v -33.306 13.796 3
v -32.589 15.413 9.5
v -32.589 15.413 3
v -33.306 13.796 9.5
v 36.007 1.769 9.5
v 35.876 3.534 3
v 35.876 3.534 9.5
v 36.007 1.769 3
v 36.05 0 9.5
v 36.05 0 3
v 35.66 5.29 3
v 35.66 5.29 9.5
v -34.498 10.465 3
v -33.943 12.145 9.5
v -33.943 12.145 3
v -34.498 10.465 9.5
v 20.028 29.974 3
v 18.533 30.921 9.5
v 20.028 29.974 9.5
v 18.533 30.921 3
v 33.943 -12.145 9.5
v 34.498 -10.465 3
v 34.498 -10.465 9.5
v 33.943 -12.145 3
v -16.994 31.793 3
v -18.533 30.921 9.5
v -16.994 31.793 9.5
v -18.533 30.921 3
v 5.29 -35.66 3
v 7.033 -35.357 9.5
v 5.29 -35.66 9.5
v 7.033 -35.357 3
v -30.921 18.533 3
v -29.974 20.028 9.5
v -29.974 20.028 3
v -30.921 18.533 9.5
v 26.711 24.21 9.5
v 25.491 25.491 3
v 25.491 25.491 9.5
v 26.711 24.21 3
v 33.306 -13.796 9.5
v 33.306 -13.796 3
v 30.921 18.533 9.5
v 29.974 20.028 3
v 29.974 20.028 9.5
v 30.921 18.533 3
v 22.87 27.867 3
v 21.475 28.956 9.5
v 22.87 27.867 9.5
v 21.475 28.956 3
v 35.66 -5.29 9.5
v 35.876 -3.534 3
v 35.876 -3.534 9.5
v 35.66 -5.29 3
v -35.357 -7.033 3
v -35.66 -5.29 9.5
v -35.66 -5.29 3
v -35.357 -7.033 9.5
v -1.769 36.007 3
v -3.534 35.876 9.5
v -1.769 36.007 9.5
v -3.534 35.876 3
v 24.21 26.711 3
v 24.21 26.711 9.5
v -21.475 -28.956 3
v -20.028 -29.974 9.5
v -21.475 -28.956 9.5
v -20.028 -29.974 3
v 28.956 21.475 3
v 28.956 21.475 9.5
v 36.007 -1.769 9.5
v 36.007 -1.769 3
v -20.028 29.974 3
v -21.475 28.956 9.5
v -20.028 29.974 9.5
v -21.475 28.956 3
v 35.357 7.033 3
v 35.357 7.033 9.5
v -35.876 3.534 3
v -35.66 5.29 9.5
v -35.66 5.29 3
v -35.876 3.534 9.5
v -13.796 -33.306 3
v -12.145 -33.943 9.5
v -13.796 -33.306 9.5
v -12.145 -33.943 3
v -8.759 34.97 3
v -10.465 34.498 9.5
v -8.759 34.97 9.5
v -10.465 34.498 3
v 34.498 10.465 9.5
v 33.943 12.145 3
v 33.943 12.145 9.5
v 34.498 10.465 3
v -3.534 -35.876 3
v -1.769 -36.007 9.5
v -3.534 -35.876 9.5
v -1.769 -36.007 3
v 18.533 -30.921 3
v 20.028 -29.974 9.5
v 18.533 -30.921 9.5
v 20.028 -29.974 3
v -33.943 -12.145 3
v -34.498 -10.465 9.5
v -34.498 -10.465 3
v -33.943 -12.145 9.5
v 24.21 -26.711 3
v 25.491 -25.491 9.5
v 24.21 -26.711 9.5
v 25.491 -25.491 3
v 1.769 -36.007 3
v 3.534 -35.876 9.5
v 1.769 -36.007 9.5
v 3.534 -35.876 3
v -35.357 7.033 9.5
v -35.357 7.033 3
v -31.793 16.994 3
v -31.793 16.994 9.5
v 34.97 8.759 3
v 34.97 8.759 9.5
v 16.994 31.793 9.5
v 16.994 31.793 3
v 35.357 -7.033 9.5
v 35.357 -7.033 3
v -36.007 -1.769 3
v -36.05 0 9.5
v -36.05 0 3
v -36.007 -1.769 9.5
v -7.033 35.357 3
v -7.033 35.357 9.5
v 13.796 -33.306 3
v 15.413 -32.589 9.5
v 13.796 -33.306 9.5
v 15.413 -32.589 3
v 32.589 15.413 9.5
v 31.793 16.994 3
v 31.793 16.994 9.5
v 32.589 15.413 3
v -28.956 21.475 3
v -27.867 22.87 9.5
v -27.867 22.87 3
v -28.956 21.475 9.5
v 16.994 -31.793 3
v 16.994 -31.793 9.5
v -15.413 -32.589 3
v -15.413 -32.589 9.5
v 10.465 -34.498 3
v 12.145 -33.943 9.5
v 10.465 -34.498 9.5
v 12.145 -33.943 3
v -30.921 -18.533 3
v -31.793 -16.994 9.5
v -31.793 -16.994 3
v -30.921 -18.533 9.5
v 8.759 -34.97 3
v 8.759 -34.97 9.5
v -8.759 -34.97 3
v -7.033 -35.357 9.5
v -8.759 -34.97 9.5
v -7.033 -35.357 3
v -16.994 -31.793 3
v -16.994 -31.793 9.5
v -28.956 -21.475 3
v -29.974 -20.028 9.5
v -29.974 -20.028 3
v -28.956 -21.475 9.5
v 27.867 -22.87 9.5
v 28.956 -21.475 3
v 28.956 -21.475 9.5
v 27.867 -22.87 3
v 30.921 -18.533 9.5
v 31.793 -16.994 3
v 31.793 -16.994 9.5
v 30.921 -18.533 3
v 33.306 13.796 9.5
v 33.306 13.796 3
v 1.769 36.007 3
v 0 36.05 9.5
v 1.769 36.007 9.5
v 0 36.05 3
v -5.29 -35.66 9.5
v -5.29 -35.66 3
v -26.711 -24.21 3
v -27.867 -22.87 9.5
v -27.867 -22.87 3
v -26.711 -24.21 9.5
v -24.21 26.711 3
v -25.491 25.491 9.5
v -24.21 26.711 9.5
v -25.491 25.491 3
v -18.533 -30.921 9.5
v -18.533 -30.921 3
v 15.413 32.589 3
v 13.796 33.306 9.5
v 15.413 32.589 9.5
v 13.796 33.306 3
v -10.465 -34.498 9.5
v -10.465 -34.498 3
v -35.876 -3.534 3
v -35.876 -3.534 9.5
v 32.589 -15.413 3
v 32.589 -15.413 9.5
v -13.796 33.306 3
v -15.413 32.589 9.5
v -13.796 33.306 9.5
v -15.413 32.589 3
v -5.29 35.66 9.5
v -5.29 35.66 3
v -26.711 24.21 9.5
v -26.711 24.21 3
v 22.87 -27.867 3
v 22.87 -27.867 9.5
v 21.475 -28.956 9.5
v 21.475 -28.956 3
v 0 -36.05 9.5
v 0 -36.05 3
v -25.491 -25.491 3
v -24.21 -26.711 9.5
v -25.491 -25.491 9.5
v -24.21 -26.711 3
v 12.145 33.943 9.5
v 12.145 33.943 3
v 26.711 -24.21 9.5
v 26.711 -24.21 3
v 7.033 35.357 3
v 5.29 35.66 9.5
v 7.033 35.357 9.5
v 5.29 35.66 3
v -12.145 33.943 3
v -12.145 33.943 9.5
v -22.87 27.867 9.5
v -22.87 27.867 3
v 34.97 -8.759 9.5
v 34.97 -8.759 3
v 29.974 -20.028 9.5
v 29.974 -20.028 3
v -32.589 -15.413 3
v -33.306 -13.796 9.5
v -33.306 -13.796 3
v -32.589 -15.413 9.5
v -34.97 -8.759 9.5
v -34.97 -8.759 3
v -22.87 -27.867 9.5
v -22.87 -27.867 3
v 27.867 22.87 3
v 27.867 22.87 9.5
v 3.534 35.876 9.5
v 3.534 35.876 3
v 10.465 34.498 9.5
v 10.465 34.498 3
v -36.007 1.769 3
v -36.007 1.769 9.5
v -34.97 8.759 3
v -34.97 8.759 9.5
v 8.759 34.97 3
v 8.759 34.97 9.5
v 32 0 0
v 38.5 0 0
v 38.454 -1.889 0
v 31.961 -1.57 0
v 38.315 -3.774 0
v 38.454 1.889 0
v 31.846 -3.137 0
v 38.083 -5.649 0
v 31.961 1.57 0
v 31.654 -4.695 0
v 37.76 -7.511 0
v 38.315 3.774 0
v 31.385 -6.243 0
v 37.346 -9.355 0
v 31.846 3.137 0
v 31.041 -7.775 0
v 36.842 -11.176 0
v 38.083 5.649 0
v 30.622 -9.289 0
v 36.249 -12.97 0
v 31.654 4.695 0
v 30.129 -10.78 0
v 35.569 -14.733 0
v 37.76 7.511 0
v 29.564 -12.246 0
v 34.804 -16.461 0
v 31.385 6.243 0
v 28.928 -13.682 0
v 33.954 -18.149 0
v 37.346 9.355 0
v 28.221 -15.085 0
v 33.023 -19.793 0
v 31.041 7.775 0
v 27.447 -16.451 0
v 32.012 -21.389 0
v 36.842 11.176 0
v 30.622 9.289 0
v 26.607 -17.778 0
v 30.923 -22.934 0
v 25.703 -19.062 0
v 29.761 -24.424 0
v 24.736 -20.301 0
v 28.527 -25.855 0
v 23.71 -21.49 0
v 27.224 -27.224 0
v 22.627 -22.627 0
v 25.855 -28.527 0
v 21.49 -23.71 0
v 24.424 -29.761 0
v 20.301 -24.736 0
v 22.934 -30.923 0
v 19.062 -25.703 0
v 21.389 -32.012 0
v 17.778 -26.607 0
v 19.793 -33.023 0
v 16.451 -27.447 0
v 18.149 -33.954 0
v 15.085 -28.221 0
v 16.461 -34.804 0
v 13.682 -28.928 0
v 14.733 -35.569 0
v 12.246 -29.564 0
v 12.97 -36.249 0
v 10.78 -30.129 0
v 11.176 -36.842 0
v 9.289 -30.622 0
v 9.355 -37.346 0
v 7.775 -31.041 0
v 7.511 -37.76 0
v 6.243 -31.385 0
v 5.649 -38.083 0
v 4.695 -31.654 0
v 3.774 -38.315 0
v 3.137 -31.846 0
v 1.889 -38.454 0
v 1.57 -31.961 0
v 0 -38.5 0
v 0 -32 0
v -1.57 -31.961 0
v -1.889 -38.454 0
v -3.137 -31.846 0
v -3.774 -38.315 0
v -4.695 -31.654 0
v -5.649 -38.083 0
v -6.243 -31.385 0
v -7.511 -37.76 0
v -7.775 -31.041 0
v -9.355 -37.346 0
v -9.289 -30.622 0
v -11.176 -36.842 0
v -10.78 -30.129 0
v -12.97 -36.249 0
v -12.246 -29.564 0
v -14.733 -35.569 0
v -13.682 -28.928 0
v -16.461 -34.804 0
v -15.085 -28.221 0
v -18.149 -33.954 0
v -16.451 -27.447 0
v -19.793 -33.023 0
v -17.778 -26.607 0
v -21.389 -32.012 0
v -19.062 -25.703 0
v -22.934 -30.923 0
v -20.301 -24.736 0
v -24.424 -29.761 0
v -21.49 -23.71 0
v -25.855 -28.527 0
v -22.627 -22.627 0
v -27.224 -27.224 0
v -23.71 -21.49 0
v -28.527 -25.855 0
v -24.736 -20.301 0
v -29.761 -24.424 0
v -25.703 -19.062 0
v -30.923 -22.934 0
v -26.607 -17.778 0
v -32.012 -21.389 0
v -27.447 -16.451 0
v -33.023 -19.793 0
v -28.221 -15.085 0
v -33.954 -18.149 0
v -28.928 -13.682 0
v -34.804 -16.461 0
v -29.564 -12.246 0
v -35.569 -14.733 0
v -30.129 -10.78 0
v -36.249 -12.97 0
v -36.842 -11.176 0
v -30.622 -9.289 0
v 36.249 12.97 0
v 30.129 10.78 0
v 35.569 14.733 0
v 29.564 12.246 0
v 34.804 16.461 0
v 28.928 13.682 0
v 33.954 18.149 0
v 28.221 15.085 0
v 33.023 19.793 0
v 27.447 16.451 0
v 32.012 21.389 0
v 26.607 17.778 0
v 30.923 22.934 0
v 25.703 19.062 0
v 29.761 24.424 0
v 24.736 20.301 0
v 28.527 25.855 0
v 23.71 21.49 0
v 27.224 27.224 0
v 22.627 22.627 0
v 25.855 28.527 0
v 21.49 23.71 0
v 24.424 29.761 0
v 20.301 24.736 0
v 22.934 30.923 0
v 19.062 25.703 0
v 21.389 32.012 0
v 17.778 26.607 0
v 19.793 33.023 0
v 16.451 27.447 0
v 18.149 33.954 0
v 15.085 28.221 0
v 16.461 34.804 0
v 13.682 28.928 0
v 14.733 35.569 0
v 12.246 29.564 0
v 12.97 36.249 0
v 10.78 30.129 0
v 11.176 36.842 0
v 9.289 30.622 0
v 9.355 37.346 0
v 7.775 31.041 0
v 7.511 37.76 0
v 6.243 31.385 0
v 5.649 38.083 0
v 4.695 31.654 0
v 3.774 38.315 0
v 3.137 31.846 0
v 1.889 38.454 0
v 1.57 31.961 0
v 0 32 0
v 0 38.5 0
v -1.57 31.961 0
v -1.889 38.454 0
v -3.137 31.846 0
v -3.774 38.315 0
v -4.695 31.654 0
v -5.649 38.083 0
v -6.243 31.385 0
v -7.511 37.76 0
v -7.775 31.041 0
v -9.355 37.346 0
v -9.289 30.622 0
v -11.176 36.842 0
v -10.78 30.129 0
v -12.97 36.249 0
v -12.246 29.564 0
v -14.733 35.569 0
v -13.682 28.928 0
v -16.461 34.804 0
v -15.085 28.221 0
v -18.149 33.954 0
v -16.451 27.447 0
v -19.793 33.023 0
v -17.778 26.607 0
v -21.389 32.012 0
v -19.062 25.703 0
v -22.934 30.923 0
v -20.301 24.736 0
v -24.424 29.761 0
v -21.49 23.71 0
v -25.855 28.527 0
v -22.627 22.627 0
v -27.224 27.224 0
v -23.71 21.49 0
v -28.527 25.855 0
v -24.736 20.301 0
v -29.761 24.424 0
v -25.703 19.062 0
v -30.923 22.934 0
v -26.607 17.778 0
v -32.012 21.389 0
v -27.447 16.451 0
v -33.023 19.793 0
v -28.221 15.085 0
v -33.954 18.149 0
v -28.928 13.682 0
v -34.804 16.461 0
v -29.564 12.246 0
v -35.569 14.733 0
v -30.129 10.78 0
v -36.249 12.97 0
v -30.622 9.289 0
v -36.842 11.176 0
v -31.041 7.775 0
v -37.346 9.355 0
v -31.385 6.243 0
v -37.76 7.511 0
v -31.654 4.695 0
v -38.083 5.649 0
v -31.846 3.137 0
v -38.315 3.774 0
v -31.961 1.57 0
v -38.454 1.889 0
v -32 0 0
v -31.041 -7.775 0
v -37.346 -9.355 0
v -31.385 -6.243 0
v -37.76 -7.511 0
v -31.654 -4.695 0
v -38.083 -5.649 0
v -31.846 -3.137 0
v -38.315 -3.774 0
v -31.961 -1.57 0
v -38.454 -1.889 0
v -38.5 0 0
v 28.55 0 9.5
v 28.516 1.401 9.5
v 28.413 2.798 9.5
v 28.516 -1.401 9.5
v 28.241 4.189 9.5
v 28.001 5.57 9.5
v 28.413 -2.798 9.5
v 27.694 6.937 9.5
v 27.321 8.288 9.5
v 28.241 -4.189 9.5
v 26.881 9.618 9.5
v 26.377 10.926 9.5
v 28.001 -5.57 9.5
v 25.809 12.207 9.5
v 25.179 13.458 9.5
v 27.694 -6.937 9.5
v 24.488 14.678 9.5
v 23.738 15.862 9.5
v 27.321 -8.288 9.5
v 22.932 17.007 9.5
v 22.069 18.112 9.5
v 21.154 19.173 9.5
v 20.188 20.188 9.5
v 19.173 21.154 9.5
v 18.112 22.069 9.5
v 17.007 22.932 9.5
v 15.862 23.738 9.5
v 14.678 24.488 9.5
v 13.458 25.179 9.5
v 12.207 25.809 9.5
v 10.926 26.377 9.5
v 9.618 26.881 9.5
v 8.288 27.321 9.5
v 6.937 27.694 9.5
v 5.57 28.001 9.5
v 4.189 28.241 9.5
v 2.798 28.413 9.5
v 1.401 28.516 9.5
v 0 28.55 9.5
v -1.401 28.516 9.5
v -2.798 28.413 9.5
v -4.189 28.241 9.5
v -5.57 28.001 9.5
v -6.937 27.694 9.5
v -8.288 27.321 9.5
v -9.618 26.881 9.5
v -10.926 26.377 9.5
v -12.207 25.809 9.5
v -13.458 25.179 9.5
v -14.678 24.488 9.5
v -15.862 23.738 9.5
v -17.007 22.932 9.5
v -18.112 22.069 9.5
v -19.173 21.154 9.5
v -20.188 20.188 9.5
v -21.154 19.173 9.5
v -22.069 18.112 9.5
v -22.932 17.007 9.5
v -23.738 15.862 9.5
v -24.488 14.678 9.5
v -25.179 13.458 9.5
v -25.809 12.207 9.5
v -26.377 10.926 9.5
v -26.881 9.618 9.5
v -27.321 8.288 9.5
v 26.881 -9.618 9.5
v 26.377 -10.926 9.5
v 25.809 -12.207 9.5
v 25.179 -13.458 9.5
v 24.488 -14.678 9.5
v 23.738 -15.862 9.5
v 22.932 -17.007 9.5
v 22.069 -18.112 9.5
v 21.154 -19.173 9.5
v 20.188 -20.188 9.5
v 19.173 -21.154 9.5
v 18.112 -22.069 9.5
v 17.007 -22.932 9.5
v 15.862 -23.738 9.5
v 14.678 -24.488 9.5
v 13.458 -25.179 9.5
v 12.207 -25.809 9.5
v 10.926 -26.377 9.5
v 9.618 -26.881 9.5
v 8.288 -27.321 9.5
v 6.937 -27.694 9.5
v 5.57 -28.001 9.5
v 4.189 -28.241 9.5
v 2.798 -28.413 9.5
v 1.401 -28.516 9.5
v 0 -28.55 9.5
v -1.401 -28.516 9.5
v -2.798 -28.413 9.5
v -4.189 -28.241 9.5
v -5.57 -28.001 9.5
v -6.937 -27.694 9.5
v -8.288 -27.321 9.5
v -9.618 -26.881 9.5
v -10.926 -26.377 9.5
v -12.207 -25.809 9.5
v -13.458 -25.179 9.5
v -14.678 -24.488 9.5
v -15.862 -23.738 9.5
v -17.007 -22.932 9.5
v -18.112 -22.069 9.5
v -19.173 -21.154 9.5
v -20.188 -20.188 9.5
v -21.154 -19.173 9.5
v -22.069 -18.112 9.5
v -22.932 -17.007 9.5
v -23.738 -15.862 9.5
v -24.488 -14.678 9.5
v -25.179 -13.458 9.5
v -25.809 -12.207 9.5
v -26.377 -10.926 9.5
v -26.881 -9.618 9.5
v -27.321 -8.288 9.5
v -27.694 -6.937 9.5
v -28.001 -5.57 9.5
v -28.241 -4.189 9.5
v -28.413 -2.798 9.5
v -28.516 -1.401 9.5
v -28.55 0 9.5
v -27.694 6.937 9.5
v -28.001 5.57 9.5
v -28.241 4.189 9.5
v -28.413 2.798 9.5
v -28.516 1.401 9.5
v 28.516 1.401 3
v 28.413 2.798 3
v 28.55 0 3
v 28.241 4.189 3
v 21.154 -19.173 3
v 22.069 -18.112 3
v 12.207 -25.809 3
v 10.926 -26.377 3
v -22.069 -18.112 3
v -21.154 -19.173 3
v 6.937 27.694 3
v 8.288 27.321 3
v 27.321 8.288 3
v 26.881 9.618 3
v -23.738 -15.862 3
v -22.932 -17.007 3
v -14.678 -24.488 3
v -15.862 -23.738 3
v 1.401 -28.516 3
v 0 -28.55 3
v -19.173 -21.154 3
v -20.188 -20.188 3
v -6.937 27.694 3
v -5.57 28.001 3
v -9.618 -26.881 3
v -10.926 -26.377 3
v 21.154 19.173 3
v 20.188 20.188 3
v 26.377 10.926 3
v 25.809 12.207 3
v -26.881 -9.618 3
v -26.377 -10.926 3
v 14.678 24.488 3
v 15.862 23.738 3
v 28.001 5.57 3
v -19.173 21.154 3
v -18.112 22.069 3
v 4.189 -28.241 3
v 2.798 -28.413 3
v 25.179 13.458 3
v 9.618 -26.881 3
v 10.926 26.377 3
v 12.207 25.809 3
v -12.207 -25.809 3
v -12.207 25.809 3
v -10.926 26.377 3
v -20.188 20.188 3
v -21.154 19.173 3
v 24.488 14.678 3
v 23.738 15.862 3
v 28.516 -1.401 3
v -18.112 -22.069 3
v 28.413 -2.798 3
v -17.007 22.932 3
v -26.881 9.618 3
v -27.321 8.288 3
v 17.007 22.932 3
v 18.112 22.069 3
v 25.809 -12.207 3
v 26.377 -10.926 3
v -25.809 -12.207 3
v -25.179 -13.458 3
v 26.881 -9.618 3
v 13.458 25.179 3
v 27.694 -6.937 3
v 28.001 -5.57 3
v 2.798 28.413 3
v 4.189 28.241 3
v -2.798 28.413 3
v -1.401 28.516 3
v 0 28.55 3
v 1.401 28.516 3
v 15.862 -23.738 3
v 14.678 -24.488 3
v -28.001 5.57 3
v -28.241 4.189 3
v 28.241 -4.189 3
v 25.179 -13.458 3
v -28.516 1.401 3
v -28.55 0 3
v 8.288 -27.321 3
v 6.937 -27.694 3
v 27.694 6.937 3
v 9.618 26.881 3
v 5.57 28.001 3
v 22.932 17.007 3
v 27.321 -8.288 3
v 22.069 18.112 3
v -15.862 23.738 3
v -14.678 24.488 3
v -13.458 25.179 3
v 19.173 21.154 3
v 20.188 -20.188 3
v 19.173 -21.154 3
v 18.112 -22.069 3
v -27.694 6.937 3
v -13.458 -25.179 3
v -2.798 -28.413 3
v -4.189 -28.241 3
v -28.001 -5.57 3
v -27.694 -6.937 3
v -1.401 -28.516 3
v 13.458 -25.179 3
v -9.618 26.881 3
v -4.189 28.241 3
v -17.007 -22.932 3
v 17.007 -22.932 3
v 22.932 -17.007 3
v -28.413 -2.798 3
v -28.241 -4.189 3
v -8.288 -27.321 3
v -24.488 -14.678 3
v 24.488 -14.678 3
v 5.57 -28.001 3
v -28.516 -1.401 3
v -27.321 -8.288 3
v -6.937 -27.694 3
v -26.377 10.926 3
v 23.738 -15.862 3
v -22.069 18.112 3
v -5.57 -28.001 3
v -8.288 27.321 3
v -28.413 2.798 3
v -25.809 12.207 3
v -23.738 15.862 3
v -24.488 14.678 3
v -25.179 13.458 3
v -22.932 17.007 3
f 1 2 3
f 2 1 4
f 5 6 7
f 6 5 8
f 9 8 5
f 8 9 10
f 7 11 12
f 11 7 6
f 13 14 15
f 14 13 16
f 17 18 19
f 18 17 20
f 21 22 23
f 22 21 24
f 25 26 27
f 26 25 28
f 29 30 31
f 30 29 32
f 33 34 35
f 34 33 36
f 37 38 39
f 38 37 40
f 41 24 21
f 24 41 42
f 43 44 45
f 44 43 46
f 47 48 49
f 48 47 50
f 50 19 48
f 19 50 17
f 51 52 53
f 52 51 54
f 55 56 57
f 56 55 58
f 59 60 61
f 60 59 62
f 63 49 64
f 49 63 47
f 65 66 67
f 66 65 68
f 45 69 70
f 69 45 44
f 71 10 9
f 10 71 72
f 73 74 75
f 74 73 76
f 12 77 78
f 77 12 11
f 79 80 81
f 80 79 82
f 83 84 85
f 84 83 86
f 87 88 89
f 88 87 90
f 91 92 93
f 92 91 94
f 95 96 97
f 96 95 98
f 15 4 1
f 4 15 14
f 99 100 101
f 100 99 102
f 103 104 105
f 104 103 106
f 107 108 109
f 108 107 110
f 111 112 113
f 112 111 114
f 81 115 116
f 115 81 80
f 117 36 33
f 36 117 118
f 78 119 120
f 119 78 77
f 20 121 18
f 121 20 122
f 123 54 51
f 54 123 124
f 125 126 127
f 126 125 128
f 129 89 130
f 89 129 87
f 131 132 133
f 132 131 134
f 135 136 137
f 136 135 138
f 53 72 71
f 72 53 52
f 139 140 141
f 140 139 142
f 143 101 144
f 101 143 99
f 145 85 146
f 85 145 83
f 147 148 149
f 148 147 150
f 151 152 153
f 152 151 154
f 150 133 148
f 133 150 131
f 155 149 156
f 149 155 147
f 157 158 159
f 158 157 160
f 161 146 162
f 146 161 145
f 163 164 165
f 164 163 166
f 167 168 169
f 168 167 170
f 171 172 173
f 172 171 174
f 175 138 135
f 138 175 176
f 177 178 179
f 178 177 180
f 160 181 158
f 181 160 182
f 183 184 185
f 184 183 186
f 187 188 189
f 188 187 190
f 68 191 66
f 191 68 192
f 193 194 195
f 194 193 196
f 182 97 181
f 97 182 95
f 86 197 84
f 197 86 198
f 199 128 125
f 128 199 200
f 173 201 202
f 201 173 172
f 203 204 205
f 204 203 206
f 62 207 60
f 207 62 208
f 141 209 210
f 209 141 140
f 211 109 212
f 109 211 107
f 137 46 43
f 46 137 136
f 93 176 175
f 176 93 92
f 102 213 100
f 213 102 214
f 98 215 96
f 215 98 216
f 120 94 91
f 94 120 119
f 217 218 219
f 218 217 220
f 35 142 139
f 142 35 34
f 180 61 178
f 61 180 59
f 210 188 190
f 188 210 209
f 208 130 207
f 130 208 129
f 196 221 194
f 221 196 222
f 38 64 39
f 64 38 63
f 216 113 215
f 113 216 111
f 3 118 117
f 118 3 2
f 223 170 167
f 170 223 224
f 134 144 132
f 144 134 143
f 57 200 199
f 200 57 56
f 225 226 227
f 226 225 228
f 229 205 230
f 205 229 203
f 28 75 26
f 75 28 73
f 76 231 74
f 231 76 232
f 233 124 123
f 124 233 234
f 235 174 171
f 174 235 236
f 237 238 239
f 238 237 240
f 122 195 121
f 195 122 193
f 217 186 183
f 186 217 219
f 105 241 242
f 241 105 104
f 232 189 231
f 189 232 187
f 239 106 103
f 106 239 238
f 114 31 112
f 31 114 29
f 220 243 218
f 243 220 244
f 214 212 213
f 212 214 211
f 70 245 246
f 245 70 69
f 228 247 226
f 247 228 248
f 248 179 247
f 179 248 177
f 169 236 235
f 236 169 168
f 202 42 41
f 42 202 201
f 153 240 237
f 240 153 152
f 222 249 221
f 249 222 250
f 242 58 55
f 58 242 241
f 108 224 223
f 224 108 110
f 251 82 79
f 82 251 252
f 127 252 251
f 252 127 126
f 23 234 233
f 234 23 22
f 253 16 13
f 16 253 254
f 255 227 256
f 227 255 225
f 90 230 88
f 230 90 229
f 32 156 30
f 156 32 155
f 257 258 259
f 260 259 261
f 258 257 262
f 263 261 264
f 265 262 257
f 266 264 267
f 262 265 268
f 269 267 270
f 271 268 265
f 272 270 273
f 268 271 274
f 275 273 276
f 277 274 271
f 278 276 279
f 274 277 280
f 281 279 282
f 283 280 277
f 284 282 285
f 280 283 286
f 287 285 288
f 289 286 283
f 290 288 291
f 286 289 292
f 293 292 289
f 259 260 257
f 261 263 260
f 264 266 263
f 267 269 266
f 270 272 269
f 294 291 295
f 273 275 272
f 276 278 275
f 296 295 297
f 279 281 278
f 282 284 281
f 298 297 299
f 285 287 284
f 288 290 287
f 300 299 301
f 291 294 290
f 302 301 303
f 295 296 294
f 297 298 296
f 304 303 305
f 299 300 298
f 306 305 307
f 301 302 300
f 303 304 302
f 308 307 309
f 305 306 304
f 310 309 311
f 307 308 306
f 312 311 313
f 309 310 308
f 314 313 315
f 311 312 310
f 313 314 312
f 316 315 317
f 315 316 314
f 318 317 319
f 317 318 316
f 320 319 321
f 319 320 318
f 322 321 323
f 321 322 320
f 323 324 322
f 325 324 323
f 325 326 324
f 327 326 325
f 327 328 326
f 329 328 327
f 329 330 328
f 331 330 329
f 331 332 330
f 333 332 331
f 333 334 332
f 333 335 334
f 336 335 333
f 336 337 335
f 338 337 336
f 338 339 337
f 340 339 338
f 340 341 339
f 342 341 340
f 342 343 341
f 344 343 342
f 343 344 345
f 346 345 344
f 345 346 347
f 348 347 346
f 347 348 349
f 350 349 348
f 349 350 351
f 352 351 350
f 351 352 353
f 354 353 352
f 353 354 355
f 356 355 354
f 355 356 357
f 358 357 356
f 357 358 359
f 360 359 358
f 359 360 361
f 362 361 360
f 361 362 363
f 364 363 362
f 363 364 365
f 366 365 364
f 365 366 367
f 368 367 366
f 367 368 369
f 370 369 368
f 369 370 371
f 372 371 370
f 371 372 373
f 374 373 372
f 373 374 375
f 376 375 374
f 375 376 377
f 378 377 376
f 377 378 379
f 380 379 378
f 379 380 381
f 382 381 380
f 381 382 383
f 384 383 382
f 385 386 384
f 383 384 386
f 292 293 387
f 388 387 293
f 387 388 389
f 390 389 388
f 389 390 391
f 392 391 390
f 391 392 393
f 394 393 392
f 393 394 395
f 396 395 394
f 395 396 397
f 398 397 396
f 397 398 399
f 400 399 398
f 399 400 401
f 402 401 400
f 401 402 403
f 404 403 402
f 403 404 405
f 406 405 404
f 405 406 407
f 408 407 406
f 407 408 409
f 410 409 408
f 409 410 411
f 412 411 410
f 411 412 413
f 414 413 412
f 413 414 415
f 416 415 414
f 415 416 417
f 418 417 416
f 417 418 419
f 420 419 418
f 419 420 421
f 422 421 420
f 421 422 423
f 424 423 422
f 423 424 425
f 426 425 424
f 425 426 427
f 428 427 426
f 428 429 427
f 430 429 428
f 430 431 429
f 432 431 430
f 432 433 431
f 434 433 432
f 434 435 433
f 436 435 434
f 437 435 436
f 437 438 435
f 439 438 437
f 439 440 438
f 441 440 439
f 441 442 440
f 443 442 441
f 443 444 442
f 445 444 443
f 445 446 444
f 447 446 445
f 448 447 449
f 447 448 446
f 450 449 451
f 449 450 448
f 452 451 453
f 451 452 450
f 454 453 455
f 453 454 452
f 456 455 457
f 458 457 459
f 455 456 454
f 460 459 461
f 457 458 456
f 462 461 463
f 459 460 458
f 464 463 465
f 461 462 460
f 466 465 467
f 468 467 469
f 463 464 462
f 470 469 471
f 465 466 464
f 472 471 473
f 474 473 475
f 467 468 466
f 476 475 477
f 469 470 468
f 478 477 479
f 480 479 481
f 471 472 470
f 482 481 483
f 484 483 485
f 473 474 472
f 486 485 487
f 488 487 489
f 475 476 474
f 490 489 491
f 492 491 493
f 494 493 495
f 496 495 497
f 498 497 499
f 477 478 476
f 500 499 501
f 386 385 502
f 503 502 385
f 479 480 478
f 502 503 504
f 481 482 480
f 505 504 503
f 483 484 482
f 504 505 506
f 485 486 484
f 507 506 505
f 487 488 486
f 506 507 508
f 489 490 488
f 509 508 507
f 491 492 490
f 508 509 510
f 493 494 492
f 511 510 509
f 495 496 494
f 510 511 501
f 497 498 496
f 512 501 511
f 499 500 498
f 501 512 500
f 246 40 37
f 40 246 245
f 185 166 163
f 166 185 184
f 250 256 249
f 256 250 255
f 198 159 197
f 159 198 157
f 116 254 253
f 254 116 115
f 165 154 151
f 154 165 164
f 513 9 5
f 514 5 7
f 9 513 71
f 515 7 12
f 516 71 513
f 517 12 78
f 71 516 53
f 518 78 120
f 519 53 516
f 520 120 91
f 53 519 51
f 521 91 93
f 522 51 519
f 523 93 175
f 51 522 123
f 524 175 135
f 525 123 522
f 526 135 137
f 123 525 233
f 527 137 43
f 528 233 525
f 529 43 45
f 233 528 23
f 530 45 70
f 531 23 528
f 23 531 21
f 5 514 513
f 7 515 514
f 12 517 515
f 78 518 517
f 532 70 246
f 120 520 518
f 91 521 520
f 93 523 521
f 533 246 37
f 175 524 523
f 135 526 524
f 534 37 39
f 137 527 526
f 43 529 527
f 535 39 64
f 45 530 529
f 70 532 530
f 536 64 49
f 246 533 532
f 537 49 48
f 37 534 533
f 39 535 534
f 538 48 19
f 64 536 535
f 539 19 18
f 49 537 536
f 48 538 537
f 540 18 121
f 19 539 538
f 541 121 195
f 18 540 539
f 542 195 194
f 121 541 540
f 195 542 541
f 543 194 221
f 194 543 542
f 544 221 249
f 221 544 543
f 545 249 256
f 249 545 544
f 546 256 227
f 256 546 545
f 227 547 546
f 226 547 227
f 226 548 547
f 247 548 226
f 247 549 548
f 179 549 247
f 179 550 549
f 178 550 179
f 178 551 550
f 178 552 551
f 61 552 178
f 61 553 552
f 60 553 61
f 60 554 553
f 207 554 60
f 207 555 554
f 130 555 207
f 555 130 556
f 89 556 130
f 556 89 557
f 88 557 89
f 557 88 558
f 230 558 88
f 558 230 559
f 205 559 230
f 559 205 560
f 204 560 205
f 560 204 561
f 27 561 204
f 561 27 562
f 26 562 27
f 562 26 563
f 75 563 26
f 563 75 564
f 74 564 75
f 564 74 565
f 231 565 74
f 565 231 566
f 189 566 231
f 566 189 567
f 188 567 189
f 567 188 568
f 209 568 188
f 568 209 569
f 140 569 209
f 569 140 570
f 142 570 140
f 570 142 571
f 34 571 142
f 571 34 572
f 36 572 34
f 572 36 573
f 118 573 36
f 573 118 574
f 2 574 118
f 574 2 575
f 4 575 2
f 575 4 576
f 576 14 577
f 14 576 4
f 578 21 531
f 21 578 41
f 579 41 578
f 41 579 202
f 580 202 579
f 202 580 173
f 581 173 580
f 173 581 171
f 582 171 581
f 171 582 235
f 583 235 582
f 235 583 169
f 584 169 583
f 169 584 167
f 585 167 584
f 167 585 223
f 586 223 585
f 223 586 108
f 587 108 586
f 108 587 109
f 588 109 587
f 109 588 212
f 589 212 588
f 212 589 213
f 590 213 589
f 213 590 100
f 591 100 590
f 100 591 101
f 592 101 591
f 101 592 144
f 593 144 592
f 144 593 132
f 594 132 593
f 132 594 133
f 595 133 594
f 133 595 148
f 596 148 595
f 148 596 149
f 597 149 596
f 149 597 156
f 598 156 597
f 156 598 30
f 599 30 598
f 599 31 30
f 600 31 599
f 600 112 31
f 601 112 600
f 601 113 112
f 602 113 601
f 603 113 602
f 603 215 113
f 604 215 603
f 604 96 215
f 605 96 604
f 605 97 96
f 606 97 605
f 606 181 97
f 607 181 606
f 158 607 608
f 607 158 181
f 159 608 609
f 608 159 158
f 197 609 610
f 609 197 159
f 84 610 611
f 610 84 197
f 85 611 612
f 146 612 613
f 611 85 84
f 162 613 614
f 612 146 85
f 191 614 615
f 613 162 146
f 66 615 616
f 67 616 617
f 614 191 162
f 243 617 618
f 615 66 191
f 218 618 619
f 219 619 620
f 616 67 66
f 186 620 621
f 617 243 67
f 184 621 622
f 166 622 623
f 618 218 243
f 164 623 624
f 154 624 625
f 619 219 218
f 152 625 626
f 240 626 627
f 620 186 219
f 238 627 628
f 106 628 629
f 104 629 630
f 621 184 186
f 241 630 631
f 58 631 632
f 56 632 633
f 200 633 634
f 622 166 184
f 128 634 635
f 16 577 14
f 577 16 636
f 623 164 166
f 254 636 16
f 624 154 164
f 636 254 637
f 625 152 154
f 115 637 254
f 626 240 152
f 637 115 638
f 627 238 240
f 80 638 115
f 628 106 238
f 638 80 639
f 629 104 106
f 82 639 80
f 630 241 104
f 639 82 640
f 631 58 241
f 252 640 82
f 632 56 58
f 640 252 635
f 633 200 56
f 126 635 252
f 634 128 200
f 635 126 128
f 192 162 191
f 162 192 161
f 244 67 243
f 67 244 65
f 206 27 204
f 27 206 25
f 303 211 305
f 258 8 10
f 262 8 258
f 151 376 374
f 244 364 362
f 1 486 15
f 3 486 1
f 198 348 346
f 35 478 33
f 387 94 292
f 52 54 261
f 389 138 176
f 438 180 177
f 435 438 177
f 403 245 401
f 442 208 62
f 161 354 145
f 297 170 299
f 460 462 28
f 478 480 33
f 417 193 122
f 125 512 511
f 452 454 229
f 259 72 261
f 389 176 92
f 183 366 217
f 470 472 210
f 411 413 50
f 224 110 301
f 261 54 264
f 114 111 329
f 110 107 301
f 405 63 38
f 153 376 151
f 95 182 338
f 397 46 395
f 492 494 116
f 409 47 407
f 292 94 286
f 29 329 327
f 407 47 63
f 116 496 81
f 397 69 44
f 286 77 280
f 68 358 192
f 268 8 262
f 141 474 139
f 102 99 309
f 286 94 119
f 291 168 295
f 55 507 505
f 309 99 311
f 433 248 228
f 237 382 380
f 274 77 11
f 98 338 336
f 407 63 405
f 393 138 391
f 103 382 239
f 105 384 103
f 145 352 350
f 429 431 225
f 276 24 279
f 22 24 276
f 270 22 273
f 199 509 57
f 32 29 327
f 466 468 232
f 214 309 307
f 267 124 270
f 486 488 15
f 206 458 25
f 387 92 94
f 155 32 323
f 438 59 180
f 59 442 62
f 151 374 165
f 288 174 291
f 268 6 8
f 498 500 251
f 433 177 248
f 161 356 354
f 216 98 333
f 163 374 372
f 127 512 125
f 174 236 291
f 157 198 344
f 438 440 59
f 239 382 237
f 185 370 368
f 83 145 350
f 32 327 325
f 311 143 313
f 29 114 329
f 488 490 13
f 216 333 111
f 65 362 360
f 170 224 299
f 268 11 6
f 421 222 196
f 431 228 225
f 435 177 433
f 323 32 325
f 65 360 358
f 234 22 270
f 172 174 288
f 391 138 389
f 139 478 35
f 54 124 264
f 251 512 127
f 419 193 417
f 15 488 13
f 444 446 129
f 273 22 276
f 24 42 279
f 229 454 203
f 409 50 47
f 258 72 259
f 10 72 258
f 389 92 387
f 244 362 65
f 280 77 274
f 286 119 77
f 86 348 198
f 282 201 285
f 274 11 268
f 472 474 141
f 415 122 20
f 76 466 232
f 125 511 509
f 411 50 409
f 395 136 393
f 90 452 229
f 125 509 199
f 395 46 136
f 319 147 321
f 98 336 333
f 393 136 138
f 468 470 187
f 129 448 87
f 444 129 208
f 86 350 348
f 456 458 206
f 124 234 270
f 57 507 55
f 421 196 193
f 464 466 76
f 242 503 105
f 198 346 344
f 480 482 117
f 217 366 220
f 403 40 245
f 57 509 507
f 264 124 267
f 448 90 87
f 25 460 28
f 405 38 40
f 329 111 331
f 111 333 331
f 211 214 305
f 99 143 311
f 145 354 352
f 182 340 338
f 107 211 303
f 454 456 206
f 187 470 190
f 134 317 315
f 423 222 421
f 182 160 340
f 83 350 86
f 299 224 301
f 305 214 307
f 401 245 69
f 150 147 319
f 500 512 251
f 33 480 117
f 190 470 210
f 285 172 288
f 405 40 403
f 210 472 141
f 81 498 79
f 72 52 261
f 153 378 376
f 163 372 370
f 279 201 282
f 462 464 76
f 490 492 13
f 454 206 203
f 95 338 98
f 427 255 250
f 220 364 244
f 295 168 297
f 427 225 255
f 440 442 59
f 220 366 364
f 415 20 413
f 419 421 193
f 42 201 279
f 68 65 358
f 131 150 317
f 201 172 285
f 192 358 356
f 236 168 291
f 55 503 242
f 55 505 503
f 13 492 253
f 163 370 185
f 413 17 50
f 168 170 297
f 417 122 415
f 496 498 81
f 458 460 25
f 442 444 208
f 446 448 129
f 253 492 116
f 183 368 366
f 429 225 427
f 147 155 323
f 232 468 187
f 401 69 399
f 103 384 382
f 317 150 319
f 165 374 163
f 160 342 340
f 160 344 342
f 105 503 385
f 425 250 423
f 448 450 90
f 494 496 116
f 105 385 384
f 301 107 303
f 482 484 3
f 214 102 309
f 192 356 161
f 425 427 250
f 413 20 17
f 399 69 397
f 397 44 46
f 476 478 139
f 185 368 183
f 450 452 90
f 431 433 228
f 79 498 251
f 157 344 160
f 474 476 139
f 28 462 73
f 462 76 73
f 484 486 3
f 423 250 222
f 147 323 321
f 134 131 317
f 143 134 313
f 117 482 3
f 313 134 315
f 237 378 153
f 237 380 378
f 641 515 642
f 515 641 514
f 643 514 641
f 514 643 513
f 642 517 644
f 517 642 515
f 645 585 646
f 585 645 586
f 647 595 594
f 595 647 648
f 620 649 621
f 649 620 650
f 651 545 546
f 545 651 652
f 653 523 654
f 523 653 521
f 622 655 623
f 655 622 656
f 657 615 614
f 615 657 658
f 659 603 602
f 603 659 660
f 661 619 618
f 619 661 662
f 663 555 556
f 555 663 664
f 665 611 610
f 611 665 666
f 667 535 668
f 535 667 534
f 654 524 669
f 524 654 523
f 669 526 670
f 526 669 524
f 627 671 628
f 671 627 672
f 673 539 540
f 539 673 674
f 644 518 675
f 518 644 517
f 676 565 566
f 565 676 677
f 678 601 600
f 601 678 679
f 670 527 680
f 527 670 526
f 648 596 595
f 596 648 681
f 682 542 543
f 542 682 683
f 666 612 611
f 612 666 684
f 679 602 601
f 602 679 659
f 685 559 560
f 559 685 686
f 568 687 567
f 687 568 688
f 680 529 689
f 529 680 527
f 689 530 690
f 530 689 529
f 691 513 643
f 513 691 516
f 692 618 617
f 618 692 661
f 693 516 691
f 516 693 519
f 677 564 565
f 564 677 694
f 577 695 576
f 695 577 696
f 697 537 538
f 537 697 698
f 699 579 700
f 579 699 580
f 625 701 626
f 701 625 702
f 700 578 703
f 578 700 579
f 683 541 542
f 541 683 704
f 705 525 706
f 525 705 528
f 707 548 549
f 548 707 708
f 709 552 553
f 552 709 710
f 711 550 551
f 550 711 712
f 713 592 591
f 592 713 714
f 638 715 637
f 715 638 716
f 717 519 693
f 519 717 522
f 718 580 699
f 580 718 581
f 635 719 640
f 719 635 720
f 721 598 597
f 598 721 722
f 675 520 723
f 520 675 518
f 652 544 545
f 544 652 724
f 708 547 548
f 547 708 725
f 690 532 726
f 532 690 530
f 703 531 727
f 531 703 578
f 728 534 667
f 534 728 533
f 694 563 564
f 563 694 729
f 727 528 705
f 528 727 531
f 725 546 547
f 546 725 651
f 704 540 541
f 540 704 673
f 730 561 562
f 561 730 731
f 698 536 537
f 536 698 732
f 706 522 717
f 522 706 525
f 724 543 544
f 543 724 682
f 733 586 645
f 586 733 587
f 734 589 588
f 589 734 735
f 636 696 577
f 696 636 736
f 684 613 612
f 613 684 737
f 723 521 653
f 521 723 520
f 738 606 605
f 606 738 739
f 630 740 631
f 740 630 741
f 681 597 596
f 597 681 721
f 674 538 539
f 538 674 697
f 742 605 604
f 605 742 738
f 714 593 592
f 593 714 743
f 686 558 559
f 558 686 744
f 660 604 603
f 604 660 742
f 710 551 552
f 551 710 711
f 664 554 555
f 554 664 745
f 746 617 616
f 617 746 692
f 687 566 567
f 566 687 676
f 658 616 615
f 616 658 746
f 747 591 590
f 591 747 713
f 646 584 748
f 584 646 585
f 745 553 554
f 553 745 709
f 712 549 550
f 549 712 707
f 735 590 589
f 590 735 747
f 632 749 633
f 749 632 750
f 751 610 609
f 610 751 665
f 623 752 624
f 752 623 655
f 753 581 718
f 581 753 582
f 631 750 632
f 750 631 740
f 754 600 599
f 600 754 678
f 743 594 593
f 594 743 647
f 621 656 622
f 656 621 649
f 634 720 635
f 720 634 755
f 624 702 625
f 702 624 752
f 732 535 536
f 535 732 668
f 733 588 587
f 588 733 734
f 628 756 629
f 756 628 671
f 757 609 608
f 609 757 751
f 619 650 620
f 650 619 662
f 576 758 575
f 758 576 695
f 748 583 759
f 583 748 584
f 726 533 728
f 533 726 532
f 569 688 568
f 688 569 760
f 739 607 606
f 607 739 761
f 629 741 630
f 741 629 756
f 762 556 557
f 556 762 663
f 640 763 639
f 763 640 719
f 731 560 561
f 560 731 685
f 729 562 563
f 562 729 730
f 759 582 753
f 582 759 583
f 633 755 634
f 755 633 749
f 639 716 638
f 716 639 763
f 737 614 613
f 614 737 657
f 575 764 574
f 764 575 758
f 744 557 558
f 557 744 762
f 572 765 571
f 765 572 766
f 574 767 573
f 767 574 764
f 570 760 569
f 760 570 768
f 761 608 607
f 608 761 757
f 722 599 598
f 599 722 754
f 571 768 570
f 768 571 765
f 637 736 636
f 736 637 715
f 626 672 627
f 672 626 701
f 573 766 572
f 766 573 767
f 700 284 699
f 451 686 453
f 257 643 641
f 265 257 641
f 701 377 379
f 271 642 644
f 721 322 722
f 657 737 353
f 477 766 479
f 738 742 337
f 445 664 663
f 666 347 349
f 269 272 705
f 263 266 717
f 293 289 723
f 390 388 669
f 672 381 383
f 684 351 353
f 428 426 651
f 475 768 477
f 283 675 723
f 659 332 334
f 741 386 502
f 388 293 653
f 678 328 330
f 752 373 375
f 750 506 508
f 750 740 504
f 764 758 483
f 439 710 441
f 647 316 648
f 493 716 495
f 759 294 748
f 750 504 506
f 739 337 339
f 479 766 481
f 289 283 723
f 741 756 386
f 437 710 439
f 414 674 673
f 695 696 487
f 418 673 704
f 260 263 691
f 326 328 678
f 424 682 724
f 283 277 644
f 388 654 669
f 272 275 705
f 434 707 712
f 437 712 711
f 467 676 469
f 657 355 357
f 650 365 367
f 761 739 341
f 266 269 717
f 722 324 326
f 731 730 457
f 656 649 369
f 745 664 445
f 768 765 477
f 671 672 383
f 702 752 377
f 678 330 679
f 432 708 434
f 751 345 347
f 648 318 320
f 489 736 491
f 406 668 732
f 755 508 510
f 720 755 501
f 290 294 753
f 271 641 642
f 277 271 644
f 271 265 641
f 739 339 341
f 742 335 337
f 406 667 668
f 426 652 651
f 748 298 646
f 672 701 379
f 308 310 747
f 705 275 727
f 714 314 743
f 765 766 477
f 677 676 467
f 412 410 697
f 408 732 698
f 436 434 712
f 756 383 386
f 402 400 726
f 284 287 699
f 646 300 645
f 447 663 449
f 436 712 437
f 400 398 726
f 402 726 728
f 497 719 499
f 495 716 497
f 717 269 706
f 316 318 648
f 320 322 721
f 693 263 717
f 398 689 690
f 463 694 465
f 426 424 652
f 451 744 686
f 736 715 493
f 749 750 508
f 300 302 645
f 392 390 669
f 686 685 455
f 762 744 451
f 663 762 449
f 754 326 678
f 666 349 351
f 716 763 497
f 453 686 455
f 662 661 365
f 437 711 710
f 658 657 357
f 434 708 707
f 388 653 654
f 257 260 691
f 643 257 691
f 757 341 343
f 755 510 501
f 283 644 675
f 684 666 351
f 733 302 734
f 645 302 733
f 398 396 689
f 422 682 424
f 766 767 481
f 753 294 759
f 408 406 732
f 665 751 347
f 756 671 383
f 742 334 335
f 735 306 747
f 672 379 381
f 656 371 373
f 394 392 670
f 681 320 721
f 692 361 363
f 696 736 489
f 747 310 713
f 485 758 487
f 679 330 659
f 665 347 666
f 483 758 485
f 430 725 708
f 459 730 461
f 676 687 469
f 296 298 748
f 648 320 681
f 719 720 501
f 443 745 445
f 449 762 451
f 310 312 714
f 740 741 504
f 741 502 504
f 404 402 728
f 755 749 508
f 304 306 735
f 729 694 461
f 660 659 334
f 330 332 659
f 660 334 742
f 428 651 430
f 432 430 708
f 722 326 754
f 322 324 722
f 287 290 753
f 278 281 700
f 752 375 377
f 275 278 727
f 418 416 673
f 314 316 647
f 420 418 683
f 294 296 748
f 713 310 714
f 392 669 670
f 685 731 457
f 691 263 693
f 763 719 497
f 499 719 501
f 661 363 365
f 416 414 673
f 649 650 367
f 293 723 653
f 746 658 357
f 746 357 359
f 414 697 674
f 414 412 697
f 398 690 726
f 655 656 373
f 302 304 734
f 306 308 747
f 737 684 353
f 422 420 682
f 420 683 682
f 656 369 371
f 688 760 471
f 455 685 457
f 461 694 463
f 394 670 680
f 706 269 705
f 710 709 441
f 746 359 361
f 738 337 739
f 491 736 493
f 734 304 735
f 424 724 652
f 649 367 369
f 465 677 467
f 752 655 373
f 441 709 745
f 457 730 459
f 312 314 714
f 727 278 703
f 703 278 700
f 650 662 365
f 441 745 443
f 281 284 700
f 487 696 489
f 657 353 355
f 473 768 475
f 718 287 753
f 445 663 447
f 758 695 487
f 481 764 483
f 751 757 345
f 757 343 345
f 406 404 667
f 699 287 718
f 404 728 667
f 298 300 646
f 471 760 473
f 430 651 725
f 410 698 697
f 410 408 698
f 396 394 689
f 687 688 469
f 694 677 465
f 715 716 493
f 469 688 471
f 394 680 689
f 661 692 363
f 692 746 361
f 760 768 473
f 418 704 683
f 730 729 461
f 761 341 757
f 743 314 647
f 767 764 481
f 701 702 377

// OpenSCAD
// Outer Diameter
    OD = 72.1;
// Inner Diameter
    ID = 57.1;
// Taper's Outer Diameter
    Taper_OD = 77;
// Taper's Inner Diameter
    Taper_InnerD = 64;
// Overall Thickness
    Thickness = 9.5;
// Taper Thickness
    Taper_Thickness = 3;


module WheelSpacer (OD, ID, Taper_OD, Taper_InnerD, Thickness, Taper_Thickness)
{
difference()
{
	union()
	{
		cylinder(h = Thickness, r = OD/2, $fn= 128);
		cylinder(h = Taper_Thickness, r1 = Taper_OD/2, r2= OD/2, $fn = 128);
	}
	translate([0,0,-0.5]) cylinder(h = Thickness+1, r = ID/2, $fn = 128);
	cylinder(h = Taper_Thickness, r1 = Taper_InnerD/2, r2 = ID/2, $fn = 128);
}


}







WheelSpacer(OD, ID, Taper_OD, Taper_InnerD, Thickness, Taper_Thickness);
